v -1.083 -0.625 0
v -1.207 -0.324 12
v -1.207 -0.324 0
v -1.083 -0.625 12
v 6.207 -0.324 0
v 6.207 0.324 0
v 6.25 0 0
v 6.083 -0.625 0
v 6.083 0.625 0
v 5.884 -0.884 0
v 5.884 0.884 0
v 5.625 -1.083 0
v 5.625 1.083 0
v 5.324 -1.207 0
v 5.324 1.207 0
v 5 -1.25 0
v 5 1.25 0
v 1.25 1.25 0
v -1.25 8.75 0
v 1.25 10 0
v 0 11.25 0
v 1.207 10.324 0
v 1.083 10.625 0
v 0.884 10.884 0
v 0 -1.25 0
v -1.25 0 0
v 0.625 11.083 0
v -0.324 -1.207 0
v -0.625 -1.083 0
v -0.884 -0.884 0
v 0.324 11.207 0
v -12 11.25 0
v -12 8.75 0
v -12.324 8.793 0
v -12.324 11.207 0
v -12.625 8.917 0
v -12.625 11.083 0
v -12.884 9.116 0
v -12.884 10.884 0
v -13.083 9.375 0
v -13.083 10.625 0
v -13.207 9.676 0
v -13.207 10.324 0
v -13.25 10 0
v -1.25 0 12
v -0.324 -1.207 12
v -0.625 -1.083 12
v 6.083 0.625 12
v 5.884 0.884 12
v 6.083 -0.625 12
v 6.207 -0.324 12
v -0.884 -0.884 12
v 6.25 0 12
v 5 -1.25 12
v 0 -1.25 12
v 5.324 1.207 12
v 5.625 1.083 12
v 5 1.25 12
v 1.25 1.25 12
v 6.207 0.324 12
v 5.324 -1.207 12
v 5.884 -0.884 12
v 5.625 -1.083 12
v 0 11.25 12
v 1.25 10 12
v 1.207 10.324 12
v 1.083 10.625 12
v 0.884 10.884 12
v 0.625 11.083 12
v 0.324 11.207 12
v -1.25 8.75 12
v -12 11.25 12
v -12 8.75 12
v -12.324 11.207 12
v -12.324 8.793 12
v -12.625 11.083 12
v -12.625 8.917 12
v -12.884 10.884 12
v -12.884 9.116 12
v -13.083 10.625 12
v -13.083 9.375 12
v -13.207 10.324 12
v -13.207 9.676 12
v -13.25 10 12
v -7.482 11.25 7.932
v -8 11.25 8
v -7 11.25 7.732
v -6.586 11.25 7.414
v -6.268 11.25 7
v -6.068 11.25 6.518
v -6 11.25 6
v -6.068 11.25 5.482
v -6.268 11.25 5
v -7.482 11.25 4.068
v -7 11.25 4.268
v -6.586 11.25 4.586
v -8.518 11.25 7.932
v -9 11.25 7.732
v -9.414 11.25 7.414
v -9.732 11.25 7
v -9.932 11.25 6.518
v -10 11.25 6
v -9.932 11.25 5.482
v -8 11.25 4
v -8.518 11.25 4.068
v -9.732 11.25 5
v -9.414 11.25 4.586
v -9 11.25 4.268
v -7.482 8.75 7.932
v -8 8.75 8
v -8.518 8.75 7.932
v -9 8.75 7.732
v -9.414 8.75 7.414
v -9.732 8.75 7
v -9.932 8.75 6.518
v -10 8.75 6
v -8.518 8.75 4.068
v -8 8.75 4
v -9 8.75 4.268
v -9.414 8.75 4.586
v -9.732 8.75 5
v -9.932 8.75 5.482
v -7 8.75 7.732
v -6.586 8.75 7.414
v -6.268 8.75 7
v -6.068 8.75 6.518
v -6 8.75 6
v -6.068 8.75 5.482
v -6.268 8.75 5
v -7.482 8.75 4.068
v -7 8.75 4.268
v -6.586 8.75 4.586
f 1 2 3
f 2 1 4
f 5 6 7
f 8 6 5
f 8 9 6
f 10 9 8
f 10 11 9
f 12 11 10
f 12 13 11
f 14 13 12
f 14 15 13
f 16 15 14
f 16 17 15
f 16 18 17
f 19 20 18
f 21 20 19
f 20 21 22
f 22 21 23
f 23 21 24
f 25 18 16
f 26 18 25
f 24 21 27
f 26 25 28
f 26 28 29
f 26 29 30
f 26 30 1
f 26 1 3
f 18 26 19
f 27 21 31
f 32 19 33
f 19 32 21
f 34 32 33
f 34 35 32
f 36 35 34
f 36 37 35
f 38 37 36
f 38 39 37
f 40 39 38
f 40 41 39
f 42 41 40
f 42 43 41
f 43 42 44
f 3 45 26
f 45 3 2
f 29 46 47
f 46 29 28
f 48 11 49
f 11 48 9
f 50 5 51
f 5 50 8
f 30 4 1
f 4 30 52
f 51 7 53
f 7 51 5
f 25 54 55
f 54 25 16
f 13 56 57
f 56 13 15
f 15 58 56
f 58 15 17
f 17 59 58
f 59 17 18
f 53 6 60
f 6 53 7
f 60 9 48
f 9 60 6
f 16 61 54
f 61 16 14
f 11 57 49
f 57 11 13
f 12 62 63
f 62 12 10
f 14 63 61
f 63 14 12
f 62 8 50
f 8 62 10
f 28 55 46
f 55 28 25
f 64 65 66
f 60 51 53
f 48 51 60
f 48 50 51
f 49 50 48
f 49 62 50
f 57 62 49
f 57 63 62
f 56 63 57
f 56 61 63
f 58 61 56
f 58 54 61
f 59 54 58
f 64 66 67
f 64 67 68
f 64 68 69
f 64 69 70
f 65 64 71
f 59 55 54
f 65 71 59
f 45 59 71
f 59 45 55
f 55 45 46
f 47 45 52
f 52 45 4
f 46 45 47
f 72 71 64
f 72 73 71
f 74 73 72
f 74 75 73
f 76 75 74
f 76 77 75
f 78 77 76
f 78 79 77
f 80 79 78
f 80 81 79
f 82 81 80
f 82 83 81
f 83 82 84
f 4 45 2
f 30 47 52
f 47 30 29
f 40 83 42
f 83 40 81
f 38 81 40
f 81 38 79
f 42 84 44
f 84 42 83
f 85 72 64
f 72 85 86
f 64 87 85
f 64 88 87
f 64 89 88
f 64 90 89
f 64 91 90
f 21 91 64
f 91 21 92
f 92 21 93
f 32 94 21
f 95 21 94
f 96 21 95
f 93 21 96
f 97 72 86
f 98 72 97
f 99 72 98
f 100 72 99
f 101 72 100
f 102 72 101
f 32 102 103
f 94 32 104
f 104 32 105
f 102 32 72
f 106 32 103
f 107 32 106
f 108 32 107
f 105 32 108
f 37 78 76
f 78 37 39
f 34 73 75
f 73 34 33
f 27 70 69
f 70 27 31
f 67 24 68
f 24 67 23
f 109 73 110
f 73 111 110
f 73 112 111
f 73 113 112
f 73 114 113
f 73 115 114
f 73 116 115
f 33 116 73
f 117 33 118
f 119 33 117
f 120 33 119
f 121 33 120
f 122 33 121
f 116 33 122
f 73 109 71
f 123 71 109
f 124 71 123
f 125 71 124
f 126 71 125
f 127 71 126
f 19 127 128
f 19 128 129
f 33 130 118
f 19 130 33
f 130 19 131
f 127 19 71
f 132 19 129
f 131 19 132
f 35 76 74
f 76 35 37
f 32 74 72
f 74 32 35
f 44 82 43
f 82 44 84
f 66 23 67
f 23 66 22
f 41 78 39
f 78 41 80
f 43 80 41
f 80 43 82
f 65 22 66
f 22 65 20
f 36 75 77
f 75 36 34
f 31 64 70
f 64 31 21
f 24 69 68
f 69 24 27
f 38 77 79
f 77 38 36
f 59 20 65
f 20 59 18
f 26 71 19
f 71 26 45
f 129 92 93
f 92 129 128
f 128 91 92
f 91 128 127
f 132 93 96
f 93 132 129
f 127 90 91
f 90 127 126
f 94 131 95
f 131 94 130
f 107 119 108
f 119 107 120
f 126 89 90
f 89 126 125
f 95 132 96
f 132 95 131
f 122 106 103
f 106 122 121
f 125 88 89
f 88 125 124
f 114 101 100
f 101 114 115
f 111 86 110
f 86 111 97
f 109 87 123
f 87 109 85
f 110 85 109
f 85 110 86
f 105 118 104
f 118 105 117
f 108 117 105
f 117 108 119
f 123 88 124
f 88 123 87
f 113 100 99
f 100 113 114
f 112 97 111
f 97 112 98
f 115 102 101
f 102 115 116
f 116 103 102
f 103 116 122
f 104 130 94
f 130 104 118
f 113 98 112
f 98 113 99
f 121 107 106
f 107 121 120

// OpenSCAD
// [FL_INDEX: keywords="openscad, 3d_parametric, Parametric_Tabletop_Fastener, csg_solid" | COT="Parametric OpenSCAD design from 3DCodeverse"]
// Title: Parametric Tabletop Fastener

// file: tabletop_fastener
// author: clayb.rpi@gmail.com
// date: 2014-03-17
//
// A tabletop fastener for connecting a tabletop to a slotted rail.
//
// NOTE: The convex corners are rounded to discourage warping while printing.


// The diameter of the screw being used. This affects bracket width.
SCREW_DIAMETER = 4;

// How thick the piece should be. This will need to be less than your slot width.
THICKNESS = 2.5;

// How deep the slot is.
SLOT_DEPTH = 5;

// How offset the slot is from the table top.
SLOT_OFFSET = 10;


$fn=24;

difference() {
  union() {
    linear_extrude(height=SCREW_DIAMETER * 3) {
      hull() {
        circle(r=THICKNESS / 2);
        translate([SLOT_DEPTH, 0])
        circle(r=THICKNESS / 2);
      }
    }

    linear_extrude(height=SCREW_DIAMETER * 3) {
      translate([0, SLOT_OFFSET])
      hull() {
        circle(r=THICKNESS / 2);
        translate([-SCREW_DIAMETER * 3, 0])
        circle(r=THICKNESS / 2);
      }
    }

    translate([-THICKNESS / 2, 0, 0])
    cube([THICKNESS, SLOT_OFFSET, SCREW_DIAMETER * 3]);
  }

  // Cut out a hole for the screw.
  translate([-2 * SCREW_DIAMETER, SLOT_OFFSET - THICKNESS, SCREW_DIAMETER * 3 / 2])
  rotate([-90, 0, 0])
  cylinder(r=SCREW_DIAMETER / 2, h=2 * THICKNESS);
}
